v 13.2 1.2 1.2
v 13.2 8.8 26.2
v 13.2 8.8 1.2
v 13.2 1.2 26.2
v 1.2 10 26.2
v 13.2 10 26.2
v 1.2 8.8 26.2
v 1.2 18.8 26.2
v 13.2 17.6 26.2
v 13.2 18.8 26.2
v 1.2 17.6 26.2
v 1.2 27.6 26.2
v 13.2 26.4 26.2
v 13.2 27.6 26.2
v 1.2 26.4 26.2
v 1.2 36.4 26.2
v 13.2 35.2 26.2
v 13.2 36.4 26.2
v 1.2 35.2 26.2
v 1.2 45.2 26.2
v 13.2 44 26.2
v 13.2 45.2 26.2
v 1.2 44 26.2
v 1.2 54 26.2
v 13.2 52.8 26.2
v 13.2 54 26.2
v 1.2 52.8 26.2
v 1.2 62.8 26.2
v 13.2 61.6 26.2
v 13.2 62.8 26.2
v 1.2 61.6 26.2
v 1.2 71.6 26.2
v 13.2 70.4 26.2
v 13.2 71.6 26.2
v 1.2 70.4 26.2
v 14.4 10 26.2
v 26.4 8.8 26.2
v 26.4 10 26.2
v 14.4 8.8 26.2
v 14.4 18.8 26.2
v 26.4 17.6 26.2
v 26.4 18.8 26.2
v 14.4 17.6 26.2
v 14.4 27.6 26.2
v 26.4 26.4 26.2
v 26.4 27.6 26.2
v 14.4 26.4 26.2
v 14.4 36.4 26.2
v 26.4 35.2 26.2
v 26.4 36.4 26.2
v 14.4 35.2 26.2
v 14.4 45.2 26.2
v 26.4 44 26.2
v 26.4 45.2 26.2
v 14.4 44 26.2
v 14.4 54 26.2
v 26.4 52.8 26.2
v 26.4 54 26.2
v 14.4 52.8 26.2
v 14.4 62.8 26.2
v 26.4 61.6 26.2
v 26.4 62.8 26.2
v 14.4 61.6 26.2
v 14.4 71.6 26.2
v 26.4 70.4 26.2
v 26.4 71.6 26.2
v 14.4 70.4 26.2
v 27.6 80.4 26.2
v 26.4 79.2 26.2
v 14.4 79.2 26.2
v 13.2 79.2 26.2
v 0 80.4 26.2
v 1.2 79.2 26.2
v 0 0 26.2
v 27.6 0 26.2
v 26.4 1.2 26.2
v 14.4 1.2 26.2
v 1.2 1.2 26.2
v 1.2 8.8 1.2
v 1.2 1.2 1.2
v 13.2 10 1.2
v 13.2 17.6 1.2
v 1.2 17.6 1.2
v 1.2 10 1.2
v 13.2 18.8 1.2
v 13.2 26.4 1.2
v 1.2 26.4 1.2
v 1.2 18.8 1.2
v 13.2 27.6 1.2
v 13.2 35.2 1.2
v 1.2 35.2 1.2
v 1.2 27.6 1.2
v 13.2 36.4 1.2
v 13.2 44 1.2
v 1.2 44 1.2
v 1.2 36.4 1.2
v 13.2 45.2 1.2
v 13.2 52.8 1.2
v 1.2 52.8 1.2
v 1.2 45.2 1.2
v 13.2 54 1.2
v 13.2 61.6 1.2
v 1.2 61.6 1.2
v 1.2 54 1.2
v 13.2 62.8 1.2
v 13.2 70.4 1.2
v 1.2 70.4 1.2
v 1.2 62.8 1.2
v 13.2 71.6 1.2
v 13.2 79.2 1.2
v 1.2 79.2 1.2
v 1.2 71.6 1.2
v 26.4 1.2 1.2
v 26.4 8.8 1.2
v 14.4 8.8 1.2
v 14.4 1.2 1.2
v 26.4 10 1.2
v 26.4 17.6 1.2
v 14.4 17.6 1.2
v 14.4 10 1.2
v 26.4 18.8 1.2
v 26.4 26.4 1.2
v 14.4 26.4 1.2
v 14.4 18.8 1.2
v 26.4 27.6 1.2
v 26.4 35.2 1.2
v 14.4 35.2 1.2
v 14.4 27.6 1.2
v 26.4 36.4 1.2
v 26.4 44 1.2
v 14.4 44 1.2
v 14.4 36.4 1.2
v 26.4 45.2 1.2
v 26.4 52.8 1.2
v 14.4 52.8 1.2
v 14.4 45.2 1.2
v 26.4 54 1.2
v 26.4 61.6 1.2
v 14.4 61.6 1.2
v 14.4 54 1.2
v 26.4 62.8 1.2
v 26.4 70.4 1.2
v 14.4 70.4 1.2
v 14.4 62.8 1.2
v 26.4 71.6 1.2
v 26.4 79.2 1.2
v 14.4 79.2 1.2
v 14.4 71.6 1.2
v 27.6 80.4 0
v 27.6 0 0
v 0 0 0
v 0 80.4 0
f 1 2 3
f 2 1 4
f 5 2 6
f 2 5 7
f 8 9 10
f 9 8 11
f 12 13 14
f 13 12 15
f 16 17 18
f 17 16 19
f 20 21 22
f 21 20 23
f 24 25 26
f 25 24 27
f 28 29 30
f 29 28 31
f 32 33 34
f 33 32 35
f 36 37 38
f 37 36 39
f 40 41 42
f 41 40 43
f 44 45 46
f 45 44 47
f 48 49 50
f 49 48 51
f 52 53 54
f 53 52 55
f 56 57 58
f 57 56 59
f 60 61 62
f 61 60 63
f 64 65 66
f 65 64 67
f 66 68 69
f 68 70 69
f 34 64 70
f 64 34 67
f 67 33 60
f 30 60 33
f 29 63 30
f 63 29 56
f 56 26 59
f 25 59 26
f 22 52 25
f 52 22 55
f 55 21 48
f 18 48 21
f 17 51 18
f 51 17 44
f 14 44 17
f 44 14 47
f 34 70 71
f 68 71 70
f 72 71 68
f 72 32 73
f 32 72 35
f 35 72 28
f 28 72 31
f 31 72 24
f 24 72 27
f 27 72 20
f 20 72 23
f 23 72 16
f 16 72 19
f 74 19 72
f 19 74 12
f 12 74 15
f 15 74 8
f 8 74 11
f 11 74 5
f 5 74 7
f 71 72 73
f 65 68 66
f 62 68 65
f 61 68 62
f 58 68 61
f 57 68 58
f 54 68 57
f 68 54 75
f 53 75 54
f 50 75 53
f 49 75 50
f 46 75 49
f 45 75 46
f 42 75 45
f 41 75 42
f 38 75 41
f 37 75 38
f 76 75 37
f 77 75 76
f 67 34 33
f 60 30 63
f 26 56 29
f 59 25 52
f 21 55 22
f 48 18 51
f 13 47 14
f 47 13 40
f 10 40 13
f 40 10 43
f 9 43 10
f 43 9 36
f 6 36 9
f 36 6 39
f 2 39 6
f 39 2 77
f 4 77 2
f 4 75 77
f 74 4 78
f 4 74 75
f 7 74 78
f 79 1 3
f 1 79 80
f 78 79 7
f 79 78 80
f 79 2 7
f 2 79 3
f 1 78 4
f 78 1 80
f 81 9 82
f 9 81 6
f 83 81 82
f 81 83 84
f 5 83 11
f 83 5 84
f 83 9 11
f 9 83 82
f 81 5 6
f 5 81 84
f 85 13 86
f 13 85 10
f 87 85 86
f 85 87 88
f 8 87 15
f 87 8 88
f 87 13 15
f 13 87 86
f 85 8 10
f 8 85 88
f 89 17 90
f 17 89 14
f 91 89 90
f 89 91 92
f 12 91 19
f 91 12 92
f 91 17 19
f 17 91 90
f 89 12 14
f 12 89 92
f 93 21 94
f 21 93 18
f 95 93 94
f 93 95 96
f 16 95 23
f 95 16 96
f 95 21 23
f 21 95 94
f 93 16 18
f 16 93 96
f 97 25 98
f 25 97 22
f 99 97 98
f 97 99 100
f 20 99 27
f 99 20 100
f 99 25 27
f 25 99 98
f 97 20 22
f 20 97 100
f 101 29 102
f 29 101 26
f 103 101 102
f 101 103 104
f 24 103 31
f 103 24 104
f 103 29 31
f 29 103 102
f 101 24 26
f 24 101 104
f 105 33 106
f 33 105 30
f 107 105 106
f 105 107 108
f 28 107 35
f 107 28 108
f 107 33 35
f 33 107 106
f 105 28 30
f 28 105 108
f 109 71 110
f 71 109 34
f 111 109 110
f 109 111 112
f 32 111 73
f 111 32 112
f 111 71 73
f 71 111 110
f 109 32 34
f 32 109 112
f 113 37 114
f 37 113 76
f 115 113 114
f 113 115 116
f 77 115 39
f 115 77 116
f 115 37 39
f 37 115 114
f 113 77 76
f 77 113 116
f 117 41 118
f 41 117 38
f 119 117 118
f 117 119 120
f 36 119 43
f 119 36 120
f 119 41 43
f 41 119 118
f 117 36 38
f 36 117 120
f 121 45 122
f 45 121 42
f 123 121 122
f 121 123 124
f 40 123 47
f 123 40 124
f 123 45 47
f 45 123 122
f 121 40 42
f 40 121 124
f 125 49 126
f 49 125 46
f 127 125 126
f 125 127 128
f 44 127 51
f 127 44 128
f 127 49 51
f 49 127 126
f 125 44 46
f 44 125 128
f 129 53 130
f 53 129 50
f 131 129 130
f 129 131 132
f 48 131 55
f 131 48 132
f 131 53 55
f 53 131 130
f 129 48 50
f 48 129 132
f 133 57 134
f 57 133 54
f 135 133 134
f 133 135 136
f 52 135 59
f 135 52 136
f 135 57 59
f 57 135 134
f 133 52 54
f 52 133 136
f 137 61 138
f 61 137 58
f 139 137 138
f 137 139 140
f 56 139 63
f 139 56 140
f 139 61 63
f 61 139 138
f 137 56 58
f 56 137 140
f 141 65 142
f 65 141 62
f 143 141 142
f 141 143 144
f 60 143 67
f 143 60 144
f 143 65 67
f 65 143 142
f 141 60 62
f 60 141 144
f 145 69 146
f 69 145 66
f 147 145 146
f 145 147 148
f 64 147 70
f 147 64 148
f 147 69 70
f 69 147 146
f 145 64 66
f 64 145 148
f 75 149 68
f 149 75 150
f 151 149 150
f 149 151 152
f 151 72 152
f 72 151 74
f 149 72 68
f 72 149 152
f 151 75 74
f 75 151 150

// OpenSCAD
cols = 2;
rows = 9;

walls = 1.2;
bottom = 1.2;

width = 12;
depth = 7.6;

height = 25;

echo(rows* depth + (rows + 1) * depth);
render() {
  difference() {
    cube([cols * width + (cols + 1) * walls, rows * depth + (rows + 1) * walls, height + bottom]);
    for (i = [0:cols - 1]) {
      for (j = [0:rows - 1]) {
        translate([i * width + walls * (i + 1), j * depth + walls * (j + 1), bottom]) {
          cube([width, depth, height]);
        }
      }
    }
  }
}
